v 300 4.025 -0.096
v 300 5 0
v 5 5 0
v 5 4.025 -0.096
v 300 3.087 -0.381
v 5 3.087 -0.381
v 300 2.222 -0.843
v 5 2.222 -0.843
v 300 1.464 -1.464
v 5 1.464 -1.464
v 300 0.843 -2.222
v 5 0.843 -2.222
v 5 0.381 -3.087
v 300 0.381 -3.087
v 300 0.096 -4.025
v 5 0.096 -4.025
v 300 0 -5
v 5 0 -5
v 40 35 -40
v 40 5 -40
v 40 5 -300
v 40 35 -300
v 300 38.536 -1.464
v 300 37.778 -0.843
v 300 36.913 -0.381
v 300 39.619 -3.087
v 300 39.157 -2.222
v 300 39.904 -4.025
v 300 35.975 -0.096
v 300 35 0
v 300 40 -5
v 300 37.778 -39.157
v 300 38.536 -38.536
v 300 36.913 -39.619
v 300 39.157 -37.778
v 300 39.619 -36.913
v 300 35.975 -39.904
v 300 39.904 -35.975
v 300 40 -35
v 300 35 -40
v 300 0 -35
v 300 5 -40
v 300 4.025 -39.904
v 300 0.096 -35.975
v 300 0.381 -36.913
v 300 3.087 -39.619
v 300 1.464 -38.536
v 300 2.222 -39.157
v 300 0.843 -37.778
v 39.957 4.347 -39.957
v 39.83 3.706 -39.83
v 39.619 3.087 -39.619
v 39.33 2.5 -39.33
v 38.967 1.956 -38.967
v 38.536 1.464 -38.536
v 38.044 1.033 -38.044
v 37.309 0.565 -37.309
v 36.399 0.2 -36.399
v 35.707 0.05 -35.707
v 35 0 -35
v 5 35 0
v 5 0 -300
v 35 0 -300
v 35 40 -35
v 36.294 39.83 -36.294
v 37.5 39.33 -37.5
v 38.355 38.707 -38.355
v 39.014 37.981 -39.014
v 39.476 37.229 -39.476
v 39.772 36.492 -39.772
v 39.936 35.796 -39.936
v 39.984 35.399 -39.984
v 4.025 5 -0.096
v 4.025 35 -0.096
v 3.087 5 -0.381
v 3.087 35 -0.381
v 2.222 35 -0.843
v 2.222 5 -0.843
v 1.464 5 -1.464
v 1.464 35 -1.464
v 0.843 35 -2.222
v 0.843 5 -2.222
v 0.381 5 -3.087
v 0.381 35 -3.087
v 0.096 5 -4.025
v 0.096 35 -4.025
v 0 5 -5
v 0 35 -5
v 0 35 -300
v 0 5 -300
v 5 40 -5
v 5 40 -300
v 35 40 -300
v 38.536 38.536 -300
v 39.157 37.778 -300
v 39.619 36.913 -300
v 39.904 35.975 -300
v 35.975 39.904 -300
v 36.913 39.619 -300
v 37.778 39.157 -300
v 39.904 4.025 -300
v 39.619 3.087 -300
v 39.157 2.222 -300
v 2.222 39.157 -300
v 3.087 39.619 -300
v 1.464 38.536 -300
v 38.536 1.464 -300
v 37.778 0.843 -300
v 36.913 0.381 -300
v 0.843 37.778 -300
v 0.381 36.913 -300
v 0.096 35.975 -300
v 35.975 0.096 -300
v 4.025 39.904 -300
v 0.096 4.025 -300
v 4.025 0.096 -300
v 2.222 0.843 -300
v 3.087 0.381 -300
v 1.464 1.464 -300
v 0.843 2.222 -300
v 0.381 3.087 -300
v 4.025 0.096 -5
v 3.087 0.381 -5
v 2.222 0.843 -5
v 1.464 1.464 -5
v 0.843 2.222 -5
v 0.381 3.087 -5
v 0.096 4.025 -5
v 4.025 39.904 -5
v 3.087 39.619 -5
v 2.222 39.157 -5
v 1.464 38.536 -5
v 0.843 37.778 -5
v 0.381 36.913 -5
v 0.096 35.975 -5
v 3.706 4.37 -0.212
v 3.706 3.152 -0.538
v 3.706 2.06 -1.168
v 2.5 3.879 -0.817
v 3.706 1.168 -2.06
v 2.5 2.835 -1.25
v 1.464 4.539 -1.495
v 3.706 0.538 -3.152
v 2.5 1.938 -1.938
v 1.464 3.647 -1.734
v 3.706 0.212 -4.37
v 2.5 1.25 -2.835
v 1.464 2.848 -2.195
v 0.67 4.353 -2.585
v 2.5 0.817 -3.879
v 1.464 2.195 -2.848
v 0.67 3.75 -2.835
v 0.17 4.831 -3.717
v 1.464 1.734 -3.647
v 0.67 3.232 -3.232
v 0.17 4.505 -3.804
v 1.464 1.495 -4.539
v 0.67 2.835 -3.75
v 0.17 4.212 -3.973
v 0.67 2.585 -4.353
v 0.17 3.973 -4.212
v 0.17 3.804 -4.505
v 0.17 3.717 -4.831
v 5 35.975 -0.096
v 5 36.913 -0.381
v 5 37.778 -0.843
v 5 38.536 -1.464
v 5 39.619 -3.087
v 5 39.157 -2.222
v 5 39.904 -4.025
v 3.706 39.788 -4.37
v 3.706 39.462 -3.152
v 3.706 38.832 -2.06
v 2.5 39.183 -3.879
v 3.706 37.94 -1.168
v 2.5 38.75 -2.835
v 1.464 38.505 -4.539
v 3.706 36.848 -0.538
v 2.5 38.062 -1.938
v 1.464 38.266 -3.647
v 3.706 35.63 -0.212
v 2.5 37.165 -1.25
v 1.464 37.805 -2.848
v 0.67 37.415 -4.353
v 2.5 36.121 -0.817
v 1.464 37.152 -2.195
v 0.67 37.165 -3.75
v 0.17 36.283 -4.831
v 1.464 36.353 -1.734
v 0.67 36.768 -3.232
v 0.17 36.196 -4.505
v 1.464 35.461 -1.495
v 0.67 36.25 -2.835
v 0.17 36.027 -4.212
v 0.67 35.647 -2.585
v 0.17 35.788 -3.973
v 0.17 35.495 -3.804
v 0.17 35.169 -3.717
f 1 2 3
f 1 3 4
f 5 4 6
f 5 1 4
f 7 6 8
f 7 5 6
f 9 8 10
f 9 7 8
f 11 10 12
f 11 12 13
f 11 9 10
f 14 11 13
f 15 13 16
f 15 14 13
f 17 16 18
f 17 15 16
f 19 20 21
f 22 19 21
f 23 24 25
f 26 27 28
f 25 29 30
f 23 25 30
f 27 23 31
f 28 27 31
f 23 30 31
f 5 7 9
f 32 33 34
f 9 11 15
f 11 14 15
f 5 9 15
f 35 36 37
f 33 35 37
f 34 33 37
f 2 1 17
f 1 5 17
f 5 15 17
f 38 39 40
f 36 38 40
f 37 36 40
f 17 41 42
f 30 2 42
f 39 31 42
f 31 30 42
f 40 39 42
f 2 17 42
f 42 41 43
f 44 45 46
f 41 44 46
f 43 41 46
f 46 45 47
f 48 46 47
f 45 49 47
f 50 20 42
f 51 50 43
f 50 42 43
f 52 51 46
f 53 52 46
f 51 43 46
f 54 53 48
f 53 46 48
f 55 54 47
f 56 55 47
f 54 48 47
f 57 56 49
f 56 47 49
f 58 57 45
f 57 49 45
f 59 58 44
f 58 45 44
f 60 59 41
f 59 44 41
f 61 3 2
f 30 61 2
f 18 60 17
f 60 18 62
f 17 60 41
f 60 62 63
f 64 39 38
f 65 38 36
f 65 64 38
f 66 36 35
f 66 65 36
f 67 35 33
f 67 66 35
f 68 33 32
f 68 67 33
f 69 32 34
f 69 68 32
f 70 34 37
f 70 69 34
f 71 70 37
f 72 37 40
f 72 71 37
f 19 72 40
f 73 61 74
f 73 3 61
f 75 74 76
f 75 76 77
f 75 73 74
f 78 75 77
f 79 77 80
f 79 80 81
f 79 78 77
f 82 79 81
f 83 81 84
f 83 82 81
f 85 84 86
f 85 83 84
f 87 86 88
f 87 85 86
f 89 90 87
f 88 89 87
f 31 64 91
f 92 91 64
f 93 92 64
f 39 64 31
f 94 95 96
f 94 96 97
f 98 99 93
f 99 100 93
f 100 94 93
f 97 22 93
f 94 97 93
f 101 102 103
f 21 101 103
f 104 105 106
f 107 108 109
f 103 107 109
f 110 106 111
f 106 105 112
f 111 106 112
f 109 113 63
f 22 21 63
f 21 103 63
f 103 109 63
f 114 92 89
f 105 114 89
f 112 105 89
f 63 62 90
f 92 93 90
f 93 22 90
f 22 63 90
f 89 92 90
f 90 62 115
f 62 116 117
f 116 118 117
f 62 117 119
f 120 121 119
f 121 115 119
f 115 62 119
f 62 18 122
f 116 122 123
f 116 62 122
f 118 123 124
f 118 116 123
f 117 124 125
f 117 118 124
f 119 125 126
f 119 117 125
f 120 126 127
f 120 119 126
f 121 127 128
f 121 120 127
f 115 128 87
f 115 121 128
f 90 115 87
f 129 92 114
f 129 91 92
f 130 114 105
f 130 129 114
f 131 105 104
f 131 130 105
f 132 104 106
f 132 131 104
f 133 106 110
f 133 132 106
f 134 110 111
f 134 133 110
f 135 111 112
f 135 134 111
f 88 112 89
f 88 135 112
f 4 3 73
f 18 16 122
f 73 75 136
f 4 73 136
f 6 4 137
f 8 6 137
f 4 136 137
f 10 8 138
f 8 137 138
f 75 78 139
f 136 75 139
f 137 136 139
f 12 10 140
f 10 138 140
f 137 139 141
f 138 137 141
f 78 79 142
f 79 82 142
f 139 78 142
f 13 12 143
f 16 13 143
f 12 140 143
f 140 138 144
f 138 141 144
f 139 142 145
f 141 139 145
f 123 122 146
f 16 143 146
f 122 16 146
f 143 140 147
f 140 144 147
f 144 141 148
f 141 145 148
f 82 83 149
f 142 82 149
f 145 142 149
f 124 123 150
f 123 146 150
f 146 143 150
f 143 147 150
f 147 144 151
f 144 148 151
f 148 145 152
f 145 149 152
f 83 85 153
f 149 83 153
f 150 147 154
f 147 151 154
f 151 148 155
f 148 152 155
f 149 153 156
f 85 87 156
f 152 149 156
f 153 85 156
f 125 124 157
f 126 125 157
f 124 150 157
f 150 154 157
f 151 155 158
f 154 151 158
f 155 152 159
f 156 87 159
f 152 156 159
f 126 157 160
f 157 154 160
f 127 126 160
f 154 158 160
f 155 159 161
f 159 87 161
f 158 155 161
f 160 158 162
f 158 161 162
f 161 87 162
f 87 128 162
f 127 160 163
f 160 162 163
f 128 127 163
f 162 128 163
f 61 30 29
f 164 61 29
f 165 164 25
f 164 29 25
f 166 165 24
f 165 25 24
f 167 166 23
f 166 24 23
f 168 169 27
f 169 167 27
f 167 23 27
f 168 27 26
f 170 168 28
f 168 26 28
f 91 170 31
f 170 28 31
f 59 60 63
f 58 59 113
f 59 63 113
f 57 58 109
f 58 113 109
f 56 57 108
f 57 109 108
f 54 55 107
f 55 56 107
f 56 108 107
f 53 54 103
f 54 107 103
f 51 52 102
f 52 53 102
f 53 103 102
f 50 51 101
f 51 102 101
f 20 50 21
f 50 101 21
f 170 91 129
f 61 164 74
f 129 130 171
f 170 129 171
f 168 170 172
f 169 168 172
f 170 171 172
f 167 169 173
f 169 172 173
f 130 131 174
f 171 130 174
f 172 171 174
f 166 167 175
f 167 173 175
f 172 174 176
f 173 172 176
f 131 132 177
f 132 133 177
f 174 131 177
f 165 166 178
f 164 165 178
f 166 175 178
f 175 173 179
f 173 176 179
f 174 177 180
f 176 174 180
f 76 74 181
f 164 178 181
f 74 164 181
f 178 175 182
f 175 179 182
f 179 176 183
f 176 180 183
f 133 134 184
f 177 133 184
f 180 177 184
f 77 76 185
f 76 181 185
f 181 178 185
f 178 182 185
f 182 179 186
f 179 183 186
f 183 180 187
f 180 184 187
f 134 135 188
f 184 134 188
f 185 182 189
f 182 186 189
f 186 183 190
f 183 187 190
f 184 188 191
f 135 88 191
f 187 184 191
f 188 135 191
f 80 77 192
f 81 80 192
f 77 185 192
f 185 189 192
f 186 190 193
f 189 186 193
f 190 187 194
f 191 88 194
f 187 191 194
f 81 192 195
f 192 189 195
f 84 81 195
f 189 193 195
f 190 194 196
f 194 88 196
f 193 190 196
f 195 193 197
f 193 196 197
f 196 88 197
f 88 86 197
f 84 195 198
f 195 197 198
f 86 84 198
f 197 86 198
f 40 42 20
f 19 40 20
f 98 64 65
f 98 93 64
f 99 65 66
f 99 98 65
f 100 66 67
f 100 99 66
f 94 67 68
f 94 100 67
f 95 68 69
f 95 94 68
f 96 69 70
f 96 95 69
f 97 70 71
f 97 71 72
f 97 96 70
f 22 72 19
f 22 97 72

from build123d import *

# Parameters (mm, degrees)
BOSS_EXTRUDE1_DEPTH = 40
FILLET1_R           = 5
FILLET2_R           = 5
FILLET3_R           = 5


with BuildPart() as part:
    # Sketch1 → Boss-Extrude1 (new body)
    with BuildSketch(Plane(origin=(0, 0, 0), x_dir=(1, 0, 0), z_dir=(0, 1, 0))):
        Polygon((0, 0), (300, 0), (300, 40), (40, 40), (40, 300), (0, 300), (0, 40), align=None)
    extrude(amount=BOSS_EXTRUDE1_DEPTH)

    # Fillet1
    fillet1_edges = [part.edges().sort_by_distance(p)[0] for p in [
        (150, 40, 0),
    ]]
    fillet(fillet1_edges, radius=FILLET1_R)

    # Fillet2
    fillet2_edges = [part.edges().sort_by_distance(p)[0] for p in [
        (170, 40, -40),
        (40, 40, -170),
        (40, 0, -170),
        (150, 0, 0),
    ]]
    fillet(fillet2_edges, radius=FILLET2_R)

    # Fillet3
    fillet3_edges = [part.edges().sort_by_distance(p)[0] for p in [
        (0, 1.464466094, -1.464466094),
        (0, 20, 0),
        (0, 38.535533906, -1.464466094),
        (167.5, 0, -40),
        (0, 0, -152.5),
        (0, 40, -152.5),
    ]]
    fillet(fillet3_edges, radius=FILLET3_R)


solid = part.part
